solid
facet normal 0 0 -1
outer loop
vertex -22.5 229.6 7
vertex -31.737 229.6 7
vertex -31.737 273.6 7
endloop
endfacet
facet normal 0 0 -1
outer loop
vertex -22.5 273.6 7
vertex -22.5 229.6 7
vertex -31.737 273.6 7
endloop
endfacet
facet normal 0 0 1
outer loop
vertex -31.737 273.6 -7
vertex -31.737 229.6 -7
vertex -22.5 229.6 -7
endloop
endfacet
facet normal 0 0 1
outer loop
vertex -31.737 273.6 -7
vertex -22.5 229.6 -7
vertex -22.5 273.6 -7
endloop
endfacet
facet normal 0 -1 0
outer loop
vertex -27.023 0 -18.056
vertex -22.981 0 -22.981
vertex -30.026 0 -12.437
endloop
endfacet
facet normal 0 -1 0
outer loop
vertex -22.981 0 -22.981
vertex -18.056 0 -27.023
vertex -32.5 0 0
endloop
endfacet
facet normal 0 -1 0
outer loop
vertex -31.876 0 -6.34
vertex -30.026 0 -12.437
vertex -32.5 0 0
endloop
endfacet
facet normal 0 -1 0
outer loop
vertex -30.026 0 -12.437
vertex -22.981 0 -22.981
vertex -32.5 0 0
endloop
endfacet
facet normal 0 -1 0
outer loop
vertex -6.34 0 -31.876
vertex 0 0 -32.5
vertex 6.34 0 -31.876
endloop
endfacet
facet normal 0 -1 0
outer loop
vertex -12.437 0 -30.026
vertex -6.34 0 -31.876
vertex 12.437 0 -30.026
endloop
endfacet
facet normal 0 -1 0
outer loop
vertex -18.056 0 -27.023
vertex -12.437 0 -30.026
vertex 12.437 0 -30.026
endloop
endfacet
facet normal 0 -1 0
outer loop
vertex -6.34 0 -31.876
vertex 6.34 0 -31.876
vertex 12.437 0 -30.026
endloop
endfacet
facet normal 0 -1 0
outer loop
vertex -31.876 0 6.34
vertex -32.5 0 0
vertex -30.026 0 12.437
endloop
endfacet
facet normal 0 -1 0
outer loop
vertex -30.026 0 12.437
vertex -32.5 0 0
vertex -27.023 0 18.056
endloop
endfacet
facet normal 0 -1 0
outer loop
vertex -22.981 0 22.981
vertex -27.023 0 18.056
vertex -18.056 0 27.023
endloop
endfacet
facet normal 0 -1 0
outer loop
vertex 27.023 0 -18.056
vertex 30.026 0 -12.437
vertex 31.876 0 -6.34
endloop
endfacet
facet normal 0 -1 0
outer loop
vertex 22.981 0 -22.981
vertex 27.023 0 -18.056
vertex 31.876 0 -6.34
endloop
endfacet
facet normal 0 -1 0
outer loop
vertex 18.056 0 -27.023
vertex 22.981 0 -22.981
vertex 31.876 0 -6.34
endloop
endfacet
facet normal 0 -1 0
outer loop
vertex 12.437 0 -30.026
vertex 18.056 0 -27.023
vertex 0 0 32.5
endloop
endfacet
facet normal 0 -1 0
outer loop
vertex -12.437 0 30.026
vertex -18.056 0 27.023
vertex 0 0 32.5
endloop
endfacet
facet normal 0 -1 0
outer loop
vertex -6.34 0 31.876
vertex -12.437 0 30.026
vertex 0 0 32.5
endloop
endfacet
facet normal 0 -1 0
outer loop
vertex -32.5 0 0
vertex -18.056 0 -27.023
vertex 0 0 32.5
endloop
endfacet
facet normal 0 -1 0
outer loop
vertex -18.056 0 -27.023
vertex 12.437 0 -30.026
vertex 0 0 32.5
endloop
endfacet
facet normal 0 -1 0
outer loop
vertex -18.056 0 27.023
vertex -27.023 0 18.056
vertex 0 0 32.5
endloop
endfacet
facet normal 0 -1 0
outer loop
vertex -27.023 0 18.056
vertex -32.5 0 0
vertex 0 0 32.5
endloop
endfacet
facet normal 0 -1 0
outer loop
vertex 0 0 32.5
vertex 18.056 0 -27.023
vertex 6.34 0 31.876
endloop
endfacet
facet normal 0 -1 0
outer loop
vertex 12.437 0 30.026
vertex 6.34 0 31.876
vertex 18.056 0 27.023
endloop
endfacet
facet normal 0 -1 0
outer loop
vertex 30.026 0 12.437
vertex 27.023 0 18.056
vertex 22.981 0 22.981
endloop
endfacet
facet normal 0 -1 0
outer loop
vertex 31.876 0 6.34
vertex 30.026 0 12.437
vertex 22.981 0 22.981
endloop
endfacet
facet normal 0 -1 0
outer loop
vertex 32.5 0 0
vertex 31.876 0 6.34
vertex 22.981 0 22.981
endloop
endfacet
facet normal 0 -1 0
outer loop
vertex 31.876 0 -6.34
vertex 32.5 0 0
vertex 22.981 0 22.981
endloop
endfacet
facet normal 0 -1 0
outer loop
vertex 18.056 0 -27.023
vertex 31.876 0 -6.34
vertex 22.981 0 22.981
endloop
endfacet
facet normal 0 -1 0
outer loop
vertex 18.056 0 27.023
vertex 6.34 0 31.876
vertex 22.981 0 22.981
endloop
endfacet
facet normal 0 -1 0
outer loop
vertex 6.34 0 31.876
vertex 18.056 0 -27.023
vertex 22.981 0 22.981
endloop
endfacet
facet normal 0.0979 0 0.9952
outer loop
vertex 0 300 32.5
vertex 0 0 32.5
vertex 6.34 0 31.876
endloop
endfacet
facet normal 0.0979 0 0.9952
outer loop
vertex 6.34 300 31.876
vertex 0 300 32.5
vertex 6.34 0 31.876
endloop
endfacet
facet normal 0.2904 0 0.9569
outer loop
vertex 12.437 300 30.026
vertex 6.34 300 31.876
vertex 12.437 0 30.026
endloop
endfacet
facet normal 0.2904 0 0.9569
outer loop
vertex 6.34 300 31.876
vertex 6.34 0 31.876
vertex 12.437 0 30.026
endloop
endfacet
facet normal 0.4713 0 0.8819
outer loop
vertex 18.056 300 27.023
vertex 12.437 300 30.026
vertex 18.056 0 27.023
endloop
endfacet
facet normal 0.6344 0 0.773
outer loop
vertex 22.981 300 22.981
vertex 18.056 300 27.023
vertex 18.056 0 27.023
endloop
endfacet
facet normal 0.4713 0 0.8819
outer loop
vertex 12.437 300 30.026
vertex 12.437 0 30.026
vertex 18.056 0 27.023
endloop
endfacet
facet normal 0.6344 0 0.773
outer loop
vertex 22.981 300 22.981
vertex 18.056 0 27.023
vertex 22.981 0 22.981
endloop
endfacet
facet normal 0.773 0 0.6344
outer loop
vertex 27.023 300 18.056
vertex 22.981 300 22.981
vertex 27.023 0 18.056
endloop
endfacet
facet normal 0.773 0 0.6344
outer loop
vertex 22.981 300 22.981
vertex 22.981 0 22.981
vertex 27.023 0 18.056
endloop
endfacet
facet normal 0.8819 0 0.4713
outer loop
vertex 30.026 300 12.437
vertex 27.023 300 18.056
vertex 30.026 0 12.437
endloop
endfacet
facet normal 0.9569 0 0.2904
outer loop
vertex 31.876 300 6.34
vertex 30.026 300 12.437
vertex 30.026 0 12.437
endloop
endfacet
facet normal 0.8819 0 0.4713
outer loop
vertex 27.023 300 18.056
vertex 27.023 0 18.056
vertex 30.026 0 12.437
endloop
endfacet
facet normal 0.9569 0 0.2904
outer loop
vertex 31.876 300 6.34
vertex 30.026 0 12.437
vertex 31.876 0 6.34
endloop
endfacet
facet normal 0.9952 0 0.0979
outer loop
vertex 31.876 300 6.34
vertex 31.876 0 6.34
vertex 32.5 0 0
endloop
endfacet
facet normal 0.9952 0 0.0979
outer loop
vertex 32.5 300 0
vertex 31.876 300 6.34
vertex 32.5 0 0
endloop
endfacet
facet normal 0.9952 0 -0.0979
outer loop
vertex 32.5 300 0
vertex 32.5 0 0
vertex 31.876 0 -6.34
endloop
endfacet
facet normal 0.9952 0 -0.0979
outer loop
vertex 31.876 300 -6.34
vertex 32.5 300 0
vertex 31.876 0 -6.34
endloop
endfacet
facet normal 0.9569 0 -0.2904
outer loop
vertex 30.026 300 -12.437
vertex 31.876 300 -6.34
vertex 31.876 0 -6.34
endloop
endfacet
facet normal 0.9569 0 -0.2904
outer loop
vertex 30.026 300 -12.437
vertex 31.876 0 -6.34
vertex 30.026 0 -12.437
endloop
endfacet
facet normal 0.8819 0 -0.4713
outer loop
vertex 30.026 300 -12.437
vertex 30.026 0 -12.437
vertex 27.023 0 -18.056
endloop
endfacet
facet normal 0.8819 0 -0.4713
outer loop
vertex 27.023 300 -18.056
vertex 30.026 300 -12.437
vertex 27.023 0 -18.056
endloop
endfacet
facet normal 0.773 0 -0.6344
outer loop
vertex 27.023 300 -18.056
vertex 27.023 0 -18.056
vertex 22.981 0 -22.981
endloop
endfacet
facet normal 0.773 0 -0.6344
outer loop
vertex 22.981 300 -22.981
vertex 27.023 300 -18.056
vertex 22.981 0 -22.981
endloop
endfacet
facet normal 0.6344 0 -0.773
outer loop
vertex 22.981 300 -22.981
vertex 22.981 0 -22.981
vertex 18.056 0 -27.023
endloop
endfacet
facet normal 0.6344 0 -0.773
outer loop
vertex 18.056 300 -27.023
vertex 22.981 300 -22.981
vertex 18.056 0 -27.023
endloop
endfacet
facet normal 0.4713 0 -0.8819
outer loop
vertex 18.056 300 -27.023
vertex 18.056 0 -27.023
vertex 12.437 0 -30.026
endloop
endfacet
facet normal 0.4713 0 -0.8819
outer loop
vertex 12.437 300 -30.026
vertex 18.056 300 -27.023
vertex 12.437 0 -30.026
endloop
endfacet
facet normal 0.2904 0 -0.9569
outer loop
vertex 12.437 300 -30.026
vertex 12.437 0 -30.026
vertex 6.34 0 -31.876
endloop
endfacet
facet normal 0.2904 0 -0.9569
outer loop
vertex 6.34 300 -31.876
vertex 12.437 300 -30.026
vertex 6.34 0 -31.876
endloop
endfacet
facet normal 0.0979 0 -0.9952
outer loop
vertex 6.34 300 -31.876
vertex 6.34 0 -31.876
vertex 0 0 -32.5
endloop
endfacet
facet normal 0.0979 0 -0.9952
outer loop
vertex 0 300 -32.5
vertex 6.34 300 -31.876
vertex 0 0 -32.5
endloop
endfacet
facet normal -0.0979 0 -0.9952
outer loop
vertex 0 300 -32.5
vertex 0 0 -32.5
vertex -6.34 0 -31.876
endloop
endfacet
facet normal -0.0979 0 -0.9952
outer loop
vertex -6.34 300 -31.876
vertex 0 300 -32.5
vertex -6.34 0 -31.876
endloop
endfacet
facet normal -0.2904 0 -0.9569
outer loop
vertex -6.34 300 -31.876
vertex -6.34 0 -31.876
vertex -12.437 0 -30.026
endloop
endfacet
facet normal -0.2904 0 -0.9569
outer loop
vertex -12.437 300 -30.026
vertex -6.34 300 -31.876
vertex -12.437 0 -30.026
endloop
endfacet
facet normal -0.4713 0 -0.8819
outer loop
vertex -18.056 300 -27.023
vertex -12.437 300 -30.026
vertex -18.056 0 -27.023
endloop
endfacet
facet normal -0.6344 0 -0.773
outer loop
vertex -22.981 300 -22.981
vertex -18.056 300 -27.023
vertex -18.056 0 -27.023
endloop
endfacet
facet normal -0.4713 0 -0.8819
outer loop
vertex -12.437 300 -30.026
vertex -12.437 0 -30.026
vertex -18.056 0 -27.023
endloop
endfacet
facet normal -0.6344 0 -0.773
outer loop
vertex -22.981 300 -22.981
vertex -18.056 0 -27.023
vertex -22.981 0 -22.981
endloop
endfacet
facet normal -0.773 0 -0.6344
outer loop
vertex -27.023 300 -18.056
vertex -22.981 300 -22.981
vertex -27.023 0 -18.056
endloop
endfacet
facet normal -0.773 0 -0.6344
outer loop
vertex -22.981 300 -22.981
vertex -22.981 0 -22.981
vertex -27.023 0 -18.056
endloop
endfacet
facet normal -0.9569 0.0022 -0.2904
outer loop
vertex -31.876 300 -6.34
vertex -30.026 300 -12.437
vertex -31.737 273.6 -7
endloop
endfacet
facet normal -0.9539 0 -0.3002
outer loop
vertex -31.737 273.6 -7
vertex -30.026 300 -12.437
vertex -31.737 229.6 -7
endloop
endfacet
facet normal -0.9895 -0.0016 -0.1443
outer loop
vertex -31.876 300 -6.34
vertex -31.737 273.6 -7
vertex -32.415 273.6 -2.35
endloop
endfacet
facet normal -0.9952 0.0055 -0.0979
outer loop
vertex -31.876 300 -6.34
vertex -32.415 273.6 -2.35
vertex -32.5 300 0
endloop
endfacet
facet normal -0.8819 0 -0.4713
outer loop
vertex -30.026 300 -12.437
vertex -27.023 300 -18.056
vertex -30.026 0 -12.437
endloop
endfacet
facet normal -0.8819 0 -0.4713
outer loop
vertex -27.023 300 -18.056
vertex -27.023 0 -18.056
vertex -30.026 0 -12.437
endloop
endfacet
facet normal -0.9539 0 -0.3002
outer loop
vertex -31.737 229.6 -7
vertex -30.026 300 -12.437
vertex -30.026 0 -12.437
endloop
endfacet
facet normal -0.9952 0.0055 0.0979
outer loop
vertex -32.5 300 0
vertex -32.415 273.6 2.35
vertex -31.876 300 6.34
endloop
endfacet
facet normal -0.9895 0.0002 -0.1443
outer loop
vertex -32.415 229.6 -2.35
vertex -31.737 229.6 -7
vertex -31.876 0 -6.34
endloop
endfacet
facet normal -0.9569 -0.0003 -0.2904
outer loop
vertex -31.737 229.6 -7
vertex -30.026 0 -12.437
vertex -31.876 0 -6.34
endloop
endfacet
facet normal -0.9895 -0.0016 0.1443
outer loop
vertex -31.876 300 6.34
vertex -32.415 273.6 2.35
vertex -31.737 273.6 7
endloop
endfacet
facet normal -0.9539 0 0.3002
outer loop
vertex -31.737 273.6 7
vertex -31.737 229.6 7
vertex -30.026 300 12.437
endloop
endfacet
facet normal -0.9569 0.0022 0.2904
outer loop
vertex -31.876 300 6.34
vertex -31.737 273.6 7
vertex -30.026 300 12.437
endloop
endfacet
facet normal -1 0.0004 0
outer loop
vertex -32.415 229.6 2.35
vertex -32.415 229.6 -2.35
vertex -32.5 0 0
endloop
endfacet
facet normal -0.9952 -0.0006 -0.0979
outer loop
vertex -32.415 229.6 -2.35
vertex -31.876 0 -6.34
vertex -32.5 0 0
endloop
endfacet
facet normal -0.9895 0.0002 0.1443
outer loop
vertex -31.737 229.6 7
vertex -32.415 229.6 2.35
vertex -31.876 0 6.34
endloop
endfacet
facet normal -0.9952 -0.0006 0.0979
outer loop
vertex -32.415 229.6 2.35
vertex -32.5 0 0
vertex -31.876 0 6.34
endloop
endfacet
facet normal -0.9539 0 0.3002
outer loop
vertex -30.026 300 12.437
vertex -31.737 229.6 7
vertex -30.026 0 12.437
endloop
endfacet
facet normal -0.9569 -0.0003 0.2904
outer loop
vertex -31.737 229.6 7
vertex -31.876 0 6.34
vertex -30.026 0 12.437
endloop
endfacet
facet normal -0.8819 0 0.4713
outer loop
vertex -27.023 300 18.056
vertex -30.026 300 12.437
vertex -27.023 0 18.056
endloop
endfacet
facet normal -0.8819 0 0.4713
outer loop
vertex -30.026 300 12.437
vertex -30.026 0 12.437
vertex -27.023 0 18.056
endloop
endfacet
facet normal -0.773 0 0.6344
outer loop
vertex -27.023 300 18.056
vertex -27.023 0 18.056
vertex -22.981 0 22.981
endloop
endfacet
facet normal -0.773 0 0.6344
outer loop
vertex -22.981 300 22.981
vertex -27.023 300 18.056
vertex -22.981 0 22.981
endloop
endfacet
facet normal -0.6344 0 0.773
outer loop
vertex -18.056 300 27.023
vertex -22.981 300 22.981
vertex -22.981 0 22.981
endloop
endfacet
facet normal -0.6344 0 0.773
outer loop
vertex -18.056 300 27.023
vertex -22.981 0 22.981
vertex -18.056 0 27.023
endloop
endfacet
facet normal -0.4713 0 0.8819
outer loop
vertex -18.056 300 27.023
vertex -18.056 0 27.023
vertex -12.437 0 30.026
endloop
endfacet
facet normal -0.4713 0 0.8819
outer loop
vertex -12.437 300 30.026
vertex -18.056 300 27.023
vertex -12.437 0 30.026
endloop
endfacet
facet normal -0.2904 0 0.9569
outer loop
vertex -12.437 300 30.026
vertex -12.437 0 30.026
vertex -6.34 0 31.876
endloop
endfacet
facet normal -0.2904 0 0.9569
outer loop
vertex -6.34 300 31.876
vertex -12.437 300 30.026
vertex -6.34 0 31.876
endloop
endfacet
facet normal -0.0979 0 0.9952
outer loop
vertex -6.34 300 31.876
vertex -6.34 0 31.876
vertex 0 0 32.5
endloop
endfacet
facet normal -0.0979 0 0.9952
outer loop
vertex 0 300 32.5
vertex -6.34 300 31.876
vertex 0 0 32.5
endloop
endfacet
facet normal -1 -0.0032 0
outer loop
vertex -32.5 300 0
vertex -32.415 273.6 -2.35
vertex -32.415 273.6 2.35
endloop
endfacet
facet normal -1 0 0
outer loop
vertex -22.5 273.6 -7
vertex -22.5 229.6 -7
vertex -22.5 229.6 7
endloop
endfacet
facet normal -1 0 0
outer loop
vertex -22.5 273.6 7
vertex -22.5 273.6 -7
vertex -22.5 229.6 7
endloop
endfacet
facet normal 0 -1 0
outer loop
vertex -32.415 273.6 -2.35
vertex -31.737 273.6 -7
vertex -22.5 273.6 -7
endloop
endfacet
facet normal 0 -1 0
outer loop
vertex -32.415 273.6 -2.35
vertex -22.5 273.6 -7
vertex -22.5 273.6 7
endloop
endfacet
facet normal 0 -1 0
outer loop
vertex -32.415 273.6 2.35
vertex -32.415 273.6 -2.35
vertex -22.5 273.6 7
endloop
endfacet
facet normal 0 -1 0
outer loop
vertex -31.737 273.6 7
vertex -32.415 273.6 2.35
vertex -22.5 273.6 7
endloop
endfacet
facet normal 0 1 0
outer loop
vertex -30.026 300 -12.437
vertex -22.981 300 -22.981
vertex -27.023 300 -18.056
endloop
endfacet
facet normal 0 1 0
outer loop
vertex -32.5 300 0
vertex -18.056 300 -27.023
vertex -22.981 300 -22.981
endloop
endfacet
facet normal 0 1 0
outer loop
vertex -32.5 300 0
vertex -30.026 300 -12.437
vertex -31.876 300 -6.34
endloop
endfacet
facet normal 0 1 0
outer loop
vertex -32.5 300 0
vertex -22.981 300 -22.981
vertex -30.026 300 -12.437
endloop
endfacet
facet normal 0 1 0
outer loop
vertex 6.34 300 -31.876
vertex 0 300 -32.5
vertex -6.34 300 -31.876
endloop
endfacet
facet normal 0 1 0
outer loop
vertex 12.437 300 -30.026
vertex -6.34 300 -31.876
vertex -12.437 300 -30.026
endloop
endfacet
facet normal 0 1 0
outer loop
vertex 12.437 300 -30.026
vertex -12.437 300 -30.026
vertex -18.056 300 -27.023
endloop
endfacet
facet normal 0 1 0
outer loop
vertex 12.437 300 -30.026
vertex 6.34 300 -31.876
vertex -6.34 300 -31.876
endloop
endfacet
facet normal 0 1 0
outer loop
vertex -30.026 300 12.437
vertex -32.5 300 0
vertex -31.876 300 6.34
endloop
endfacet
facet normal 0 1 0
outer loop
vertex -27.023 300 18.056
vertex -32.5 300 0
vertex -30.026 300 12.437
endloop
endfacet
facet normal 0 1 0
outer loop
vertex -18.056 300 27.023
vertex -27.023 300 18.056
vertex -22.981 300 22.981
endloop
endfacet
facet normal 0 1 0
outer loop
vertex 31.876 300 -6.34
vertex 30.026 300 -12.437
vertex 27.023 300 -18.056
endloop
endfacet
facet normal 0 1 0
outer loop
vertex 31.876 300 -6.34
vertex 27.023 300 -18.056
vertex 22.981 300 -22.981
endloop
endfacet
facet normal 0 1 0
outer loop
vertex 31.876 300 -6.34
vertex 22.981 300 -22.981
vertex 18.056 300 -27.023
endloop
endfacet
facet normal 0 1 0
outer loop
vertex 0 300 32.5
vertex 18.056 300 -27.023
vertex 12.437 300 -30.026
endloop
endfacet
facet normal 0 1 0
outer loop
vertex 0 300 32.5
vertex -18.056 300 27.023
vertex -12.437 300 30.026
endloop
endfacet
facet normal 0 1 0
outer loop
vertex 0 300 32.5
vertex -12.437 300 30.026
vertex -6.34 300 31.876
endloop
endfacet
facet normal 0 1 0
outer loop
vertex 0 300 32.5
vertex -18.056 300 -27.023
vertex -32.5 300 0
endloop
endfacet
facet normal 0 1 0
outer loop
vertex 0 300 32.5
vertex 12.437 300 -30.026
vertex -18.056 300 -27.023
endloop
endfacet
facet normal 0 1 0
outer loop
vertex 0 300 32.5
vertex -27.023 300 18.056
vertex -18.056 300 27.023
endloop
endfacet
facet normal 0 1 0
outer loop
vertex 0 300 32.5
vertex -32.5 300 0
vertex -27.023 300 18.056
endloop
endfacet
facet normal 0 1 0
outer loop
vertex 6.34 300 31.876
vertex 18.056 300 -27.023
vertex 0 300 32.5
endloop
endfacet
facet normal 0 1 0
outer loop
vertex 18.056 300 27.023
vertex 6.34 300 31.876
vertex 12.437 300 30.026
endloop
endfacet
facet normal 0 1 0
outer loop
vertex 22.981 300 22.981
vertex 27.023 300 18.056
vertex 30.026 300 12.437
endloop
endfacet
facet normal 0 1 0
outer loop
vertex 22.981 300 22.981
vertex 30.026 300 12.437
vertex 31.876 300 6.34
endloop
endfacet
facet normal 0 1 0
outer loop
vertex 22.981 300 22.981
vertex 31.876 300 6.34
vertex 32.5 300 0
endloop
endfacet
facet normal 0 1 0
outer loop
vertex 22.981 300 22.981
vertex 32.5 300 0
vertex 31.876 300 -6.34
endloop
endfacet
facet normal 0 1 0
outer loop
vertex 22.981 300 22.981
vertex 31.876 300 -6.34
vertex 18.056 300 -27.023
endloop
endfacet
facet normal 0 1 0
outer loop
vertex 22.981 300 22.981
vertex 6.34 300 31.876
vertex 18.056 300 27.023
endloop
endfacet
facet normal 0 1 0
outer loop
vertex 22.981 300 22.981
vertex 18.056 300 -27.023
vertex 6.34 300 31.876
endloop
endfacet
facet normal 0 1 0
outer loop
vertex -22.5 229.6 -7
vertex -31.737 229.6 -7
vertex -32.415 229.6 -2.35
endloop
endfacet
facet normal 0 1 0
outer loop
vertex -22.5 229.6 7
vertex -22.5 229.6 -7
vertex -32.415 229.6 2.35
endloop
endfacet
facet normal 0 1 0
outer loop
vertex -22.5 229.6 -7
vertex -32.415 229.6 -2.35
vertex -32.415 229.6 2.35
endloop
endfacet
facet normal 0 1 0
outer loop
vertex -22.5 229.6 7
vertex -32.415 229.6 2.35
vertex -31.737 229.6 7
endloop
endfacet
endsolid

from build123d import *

# Parameters (mm, degrees)
SKETCH1_R           = 32.5
BOSS_EXTRUDE1_DEPTH = 300
SKETCH2_W           = 14
SKETCH2_H           = 44
CUT_EXTRUDE1_DEPTH  = 10


with BuildPart() as part:
    # Sketch1 → Boss-Extrude1 (new body)
    with BuildSketch(Plane(origin=(0, 0, 0), x_dir=(1, 0, 0), z_dir=(0, 1, 0))):
        Circle(SKETCH1_R)
    extrude(amount=BOSS_EXTRUDE1_DEPTH)

    # Sketch2 → Cut-Extrude1 (cut)
    with BuildSketch(Plane.ZY.offset(32.5)):
        with Locations((0, 251.6)):
            Rectangle(SKETCH2_W, SKETCH2_H)
    extrude(amount=-CUT_EXTRUDE1_DEPTH, mode=Mode.SUBTRACT)


solid = part.part
